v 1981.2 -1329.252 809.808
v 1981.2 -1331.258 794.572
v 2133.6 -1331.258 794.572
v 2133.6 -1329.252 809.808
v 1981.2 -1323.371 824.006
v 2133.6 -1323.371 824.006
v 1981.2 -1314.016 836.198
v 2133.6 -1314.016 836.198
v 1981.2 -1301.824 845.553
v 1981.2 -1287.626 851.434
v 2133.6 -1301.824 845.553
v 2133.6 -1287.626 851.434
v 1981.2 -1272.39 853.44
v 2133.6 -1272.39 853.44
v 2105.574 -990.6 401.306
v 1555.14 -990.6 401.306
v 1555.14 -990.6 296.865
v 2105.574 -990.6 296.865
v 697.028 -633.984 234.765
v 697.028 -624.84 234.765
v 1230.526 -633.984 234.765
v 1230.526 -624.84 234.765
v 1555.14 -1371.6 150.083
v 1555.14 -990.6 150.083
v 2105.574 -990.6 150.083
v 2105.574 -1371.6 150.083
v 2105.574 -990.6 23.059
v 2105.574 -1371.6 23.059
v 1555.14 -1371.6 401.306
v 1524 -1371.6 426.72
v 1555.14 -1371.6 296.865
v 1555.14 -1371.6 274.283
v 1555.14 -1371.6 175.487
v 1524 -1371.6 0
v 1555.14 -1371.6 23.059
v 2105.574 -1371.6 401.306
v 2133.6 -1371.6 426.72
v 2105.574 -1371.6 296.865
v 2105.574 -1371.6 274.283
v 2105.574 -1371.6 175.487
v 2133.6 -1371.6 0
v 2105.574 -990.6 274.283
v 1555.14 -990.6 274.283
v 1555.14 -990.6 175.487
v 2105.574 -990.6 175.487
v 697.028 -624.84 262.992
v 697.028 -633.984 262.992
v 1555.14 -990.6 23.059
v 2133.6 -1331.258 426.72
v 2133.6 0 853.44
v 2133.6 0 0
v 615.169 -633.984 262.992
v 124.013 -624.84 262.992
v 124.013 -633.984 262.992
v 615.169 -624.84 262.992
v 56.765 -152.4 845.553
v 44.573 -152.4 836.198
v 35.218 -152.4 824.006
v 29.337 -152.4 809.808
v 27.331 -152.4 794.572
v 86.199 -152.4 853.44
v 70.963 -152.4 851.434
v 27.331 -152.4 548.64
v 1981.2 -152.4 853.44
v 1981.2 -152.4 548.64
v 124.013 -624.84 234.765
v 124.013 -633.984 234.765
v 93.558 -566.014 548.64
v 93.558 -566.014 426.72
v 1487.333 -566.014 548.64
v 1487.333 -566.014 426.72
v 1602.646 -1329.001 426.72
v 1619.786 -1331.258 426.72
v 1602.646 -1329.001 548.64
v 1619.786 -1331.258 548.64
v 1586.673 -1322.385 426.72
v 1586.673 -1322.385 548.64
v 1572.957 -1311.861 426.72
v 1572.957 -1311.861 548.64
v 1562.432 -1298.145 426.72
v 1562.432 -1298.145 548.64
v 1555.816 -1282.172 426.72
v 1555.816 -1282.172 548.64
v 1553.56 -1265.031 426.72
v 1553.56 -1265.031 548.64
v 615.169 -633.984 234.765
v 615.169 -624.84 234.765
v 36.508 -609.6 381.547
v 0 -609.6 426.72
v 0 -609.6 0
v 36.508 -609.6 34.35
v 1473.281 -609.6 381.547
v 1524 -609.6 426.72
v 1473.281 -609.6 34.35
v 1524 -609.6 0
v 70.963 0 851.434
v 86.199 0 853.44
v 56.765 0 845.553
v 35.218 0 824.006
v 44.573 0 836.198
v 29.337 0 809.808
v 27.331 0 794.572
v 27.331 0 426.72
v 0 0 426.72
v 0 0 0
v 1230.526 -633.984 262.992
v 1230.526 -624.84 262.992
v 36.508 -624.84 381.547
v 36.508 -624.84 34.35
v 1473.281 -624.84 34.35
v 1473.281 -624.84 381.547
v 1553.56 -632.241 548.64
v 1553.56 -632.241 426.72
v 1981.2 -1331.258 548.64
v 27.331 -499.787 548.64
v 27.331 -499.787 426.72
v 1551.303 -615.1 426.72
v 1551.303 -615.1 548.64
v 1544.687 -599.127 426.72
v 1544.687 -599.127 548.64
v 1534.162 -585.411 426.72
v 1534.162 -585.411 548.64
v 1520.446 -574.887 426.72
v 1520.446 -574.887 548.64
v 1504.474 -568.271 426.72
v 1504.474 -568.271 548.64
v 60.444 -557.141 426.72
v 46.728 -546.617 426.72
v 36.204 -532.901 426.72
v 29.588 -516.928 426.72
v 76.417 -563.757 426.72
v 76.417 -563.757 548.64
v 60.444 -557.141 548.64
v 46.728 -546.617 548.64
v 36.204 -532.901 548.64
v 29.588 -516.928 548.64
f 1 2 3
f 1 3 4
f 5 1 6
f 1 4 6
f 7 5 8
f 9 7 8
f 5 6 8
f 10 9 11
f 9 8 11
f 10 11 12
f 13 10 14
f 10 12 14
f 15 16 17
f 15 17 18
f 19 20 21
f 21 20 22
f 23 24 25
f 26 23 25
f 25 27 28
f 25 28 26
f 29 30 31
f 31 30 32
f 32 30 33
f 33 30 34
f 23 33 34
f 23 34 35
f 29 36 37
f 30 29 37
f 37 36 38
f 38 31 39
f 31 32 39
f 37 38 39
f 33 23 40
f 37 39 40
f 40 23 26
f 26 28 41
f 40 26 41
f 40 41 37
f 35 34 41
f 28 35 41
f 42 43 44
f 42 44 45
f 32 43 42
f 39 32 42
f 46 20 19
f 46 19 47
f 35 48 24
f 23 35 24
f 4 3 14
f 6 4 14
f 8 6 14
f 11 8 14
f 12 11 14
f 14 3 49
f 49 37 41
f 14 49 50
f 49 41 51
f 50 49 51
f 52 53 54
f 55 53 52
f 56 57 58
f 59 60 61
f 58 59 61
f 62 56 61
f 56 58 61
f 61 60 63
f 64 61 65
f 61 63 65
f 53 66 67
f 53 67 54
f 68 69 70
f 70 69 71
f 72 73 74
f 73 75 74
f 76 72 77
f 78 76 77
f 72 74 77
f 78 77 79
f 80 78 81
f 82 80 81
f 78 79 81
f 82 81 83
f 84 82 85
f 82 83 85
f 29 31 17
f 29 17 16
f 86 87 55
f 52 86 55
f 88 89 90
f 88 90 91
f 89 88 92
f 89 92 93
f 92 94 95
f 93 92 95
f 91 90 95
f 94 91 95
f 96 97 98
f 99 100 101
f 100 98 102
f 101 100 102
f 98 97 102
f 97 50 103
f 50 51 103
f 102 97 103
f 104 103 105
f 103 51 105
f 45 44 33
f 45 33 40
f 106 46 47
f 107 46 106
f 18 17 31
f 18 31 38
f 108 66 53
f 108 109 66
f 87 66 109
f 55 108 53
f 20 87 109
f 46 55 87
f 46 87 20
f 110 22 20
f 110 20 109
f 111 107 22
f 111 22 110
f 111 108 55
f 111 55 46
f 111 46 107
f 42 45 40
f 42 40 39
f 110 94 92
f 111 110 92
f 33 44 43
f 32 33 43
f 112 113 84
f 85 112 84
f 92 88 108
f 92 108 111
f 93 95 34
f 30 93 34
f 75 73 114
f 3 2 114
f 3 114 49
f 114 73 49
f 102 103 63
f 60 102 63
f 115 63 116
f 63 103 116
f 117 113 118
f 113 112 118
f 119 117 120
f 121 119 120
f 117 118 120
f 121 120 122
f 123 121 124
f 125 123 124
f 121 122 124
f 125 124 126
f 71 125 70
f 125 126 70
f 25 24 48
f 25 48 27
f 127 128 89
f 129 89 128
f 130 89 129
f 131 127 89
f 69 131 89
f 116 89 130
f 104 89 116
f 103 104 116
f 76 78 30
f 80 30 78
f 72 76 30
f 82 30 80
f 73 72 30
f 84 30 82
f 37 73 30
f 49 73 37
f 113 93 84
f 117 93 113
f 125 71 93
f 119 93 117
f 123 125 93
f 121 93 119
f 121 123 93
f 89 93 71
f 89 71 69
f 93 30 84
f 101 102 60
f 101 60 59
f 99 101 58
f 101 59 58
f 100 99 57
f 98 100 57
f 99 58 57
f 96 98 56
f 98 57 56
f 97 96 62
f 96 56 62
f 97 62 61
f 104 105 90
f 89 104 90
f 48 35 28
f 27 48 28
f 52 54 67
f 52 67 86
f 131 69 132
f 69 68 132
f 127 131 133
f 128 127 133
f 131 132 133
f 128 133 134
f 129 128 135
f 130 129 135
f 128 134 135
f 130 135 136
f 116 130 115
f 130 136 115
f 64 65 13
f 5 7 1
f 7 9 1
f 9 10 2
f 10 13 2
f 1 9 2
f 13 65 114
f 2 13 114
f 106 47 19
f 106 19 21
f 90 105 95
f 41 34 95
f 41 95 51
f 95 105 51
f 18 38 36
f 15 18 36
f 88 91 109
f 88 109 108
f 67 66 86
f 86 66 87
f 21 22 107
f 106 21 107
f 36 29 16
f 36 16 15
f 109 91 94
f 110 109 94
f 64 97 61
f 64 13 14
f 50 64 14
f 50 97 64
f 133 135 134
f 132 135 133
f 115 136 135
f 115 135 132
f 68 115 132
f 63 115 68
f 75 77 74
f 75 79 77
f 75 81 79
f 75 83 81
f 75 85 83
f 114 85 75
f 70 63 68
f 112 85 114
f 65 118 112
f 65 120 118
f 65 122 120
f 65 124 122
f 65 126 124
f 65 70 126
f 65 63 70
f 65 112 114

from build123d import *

# Parameters (mm, degrees)
F1_DEPTH  = 426.72
F3_DEPTH  = 121.92
F5_DEPTH  = 304.8
F6_R      = 66.226706
F7_R      = 58.868184
F8_W      = 1436.773274
F8_H      = 347.196668
F9_DEPTH  = 15.24
F10_W     = 491.156265
F10_H     = 28.227374
F10_W_2   = 533.497333
F11_DEPTH = 9.144
F12_W     = 550.433874
F12_H     = 378.246805
F13_DEPTH = 381
F14_W     = 550.433874
F14_H     = 22.581905
F14_H_2   = 25.404632
F15_DEPTH = 381


with BuildPart() as f1:
    # F0 (on Top) → F1 (new body)
    with BuildSketch(Plane.XY):
        Polygon((2133.6, 0), (0, 0), (0, -609.6), (1524, -609.6), (1524, -1371.6), (2133.6, -1371.6), align=None)
    extrude(amount=F1_DEPTH)

    # F2 (on face) → F3 (join)
    with BuildSketch(Plane.XY.offset(426.72)):
        Polygon((2133.6, 0), (27.330885, 0), (27.330885, -566.014111), (1553.559542, -566.014111), (1553.559542, -1331.258059), (2133.6, -1331.258059), align=None)
    extrude(amount=F3_DEPTH)

    # F4 (on face) → F5 (join)
    with BuildSketch(Plane.XY.offset(548.64)):
        Polygon((2133.6, 0), (27.330885, 0), (27.330885, -152.4), (1981.2, -152.4), (1981.2, -1331.258059), (2133.6, -1331.258059), align=None)
    extrude(amount=F5_DEPTH)

    # F6
    f6_edges = [f1.edges().sort_by_distance(p)[0] for p in [
        (27.330885, -566.014111, 487.68),
        (1553.559542, -566.014111, 487.68),
        (1553.559542, -1331.258059, 487.68),
    ]]
    fillet(f6_edges, radius=F6_R)

    # F7
    f7_edges = [f1.edges().sort_by_distance(p)[0] for p in [
        (27.330885, -76.2, 853.44),
        (2057.4, -1331.258059, 853.44),
    ]]
    fillet(f7_edges, radius=F7_R)

    # F8 (on face) → F9 (join)
    with BuildSketch(Plane.XZ.offset(609.6)):
        with Locations((754.894508, 207.948759)):
            Rectangle(F8_W, F8_H)
    extrude(amount=F9_DEPTH)

    # F10 (on face) → F11 (join)
    with BuildSketch(Plane.XZ.offset(624.84)):
        with Locations((369.590856, 248.878457)):
            Rectangle(F10_W, F10_H)
        with Locations((963.777065, 248.878457)):
            Rectangle(F10_W_2, F10_H)
    extrude(amount=F11_DEPTH)

    # F12 (on face) → F13 (cut)
    with BuildSketch(Plane.XZ.offset(1371.6)):
        with Locations((1830.357432, 212.182869)):
            Rectangle(F12_W, F12_H)
    extrude(amount=-F13_DEPTH, mode=Mode.SUBTRACT)

    # F14 (on face) → F15 (join)
    with BuildSketch(Plane.XZ.offset(990.6)):
        with Locations((1830.357432, 285.574033)):
            Rectangle(F14_W, F14_H)
        with Locations((1830.357432, 162.784964)):
            Rectangle(F14_W, F14_H_2)
    extrude(amount=F15_DEPTH)


solid = f1.part
